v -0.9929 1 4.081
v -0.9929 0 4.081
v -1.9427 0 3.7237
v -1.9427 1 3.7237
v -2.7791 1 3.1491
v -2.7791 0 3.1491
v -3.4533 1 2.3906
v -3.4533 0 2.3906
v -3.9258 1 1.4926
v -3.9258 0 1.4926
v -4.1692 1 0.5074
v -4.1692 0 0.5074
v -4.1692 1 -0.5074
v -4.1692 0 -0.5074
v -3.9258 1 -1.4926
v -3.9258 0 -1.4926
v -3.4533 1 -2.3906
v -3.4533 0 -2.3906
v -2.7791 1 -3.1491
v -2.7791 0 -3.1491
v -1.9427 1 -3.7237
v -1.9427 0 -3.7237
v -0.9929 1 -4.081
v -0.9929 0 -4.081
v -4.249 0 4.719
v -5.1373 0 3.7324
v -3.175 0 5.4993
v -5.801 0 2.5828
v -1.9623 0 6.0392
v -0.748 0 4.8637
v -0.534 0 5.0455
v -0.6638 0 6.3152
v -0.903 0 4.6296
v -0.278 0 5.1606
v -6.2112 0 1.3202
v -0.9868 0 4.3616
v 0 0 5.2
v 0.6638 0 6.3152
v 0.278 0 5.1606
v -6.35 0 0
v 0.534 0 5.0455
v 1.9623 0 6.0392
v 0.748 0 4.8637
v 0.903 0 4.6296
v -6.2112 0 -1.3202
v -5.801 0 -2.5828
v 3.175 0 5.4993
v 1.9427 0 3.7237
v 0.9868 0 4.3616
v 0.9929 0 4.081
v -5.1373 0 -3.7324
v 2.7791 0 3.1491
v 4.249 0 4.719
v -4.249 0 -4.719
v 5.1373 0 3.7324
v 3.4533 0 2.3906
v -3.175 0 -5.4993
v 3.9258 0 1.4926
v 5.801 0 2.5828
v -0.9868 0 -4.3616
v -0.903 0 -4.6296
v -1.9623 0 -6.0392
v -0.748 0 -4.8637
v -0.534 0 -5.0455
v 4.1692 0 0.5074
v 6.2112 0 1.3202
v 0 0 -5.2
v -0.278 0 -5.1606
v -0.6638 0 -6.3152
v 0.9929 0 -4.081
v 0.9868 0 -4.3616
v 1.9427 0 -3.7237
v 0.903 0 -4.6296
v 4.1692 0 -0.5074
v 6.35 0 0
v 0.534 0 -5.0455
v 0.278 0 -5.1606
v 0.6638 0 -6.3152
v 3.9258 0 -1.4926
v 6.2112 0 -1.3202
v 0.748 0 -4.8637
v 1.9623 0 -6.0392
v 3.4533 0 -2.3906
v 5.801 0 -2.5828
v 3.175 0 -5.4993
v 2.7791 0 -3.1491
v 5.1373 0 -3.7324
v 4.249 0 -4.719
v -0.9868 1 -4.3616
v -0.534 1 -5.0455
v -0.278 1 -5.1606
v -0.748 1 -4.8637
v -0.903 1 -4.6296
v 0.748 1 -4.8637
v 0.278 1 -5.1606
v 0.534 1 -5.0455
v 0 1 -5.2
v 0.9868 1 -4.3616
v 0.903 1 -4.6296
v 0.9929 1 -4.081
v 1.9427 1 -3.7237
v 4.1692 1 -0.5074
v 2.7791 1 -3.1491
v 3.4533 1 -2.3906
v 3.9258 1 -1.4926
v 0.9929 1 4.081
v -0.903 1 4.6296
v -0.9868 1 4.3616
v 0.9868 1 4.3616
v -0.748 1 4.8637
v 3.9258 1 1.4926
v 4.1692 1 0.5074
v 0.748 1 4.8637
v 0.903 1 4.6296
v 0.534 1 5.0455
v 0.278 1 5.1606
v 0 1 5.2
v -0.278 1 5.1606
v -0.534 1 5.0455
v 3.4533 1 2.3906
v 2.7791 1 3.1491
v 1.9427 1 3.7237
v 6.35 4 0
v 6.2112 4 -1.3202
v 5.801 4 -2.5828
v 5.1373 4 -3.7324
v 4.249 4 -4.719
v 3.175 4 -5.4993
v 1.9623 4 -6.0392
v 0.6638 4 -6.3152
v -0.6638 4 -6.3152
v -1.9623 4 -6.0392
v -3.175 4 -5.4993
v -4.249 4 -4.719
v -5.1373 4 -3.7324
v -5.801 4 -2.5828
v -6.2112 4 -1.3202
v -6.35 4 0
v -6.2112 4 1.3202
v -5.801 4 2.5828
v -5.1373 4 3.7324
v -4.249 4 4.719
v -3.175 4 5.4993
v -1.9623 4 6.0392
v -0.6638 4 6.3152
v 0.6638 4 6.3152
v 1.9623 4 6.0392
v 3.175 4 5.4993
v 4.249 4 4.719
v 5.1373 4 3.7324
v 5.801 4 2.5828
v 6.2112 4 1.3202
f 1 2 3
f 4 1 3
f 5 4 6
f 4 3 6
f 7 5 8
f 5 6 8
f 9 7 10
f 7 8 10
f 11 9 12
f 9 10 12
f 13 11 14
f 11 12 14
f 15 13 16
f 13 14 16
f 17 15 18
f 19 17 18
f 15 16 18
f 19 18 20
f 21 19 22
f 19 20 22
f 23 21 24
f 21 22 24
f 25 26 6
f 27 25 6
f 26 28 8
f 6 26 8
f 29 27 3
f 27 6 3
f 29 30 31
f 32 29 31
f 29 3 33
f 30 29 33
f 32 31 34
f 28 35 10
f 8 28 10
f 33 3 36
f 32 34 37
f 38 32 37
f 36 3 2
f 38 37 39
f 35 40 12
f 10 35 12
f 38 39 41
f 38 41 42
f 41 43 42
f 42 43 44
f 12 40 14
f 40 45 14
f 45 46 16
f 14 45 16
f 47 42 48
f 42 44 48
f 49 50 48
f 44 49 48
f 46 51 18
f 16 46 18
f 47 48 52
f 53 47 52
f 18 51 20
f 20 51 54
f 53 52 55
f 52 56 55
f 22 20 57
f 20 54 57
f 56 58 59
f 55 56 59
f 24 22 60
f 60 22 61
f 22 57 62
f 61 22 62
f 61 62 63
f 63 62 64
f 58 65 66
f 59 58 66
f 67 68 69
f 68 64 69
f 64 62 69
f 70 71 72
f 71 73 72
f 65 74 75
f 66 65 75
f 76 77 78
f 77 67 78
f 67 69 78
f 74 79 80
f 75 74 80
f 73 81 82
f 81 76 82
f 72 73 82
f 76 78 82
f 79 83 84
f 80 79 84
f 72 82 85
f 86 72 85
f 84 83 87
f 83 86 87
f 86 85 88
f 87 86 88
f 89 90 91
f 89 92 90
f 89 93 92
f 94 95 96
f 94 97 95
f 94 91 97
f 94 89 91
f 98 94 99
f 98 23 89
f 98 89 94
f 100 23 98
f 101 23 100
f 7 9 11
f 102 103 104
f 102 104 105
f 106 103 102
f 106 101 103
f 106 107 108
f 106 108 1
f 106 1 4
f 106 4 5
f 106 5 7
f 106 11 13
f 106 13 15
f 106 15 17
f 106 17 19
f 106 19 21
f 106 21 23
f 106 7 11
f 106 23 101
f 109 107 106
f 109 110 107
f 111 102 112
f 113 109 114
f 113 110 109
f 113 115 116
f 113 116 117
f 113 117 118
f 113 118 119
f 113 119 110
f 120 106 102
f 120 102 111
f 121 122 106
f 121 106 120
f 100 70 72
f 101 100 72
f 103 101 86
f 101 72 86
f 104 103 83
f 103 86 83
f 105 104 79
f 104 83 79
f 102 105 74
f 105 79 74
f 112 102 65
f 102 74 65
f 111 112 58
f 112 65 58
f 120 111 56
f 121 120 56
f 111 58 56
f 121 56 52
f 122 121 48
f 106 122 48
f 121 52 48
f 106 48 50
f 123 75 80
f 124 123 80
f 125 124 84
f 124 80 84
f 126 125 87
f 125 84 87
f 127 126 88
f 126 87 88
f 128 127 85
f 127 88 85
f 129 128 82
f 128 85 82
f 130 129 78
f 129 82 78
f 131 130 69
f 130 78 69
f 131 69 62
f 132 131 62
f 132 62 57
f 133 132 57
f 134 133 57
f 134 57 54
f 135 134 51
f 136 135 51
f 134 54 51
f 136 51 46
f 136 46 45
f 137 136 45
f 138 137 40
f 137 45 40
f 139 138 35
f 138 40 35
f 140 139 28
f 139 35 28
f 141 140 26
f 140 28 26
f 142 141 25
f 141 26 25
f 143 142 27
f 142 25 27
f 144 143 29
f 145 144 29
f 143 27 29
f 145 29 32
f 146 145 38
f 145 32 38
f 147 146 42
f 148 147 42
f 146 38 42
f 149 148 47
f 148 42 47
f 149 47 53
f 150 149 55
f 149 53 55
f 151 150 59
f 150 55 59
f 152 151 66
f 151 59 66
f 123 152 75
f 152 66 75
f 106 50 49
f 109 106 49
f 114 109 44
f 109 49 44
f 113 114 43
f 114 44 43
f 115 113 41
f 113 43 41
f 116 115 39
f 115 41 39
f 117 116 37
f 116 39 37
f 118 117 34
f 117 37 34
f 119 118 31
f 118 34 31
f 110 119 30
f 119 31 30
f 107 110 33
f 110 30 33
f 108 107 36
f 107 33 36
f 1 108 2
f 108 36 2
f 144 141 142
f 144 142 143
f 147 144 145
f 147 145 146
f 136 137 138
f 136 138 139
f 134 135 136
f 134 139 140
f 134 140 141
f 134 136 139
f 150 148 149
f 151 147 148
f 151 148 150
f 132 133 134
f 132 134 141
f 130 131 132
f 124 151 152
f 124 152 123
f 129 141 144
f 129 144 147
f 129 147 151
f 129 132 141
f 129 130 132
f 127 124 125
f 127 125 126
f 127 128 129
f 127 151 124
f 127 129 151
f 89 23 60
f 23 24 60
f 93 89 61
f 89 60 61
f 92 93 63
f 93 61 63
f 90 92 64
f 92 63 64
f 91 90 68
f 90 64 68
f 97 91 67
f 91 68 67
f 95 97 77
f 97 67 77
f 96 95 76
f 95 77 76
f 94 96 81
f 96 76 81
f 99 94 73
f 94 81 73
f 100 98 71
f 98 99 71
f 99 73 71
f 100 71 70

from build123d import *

# Parameters (mm, degrees)
SKETCH1_R           = 6.35
BOSS_EXTRUDE1_DEPTH = 4
SKETCH2_R           = 1
CUT_EXTRUDE2_DEPTH  = 1
SKETCH2_3_R         = 4.2
SKETCH2_3_R_2       = 1
CUT_EXTRUDE3_DEPTH  = 1


with BuildPart() as part:
    # Sketch1 → Boss-Extrude1 (new body)
    with BuildSketch(Plane(origin=(0, 0, 0), x_dir=(1, 0, 0), z_dir=(0, 1, 0))):
        Circle(SKETCH1_R)
    extrude(amount=BOSS_EXTRUDE1_DEPTH)

    # Sketch2 → Cut-Extrude2 (cut)
    with BuildSketch(Plane.XZ):
        with Locations((0, -4.2)):
            Circle(SKETCH2_R)
    extrude(amount=-CUT_EXTRUDE2_DEPTH, mode=Mode.SUBTRACT)

    # Sketch2<3> → Cut-Extrude3 (cut)
    with BuildSketch(Plane.XZ):
        Circle(SKETCH2_3_R)
        with Locations((0, 4.2)):
            Circle(SKETCH2_3_R_2)
    extrude(amount=-CUT_EXTRUDE3_DEPTH, mode=Mode.SUBTRACT)


solid = part.part
